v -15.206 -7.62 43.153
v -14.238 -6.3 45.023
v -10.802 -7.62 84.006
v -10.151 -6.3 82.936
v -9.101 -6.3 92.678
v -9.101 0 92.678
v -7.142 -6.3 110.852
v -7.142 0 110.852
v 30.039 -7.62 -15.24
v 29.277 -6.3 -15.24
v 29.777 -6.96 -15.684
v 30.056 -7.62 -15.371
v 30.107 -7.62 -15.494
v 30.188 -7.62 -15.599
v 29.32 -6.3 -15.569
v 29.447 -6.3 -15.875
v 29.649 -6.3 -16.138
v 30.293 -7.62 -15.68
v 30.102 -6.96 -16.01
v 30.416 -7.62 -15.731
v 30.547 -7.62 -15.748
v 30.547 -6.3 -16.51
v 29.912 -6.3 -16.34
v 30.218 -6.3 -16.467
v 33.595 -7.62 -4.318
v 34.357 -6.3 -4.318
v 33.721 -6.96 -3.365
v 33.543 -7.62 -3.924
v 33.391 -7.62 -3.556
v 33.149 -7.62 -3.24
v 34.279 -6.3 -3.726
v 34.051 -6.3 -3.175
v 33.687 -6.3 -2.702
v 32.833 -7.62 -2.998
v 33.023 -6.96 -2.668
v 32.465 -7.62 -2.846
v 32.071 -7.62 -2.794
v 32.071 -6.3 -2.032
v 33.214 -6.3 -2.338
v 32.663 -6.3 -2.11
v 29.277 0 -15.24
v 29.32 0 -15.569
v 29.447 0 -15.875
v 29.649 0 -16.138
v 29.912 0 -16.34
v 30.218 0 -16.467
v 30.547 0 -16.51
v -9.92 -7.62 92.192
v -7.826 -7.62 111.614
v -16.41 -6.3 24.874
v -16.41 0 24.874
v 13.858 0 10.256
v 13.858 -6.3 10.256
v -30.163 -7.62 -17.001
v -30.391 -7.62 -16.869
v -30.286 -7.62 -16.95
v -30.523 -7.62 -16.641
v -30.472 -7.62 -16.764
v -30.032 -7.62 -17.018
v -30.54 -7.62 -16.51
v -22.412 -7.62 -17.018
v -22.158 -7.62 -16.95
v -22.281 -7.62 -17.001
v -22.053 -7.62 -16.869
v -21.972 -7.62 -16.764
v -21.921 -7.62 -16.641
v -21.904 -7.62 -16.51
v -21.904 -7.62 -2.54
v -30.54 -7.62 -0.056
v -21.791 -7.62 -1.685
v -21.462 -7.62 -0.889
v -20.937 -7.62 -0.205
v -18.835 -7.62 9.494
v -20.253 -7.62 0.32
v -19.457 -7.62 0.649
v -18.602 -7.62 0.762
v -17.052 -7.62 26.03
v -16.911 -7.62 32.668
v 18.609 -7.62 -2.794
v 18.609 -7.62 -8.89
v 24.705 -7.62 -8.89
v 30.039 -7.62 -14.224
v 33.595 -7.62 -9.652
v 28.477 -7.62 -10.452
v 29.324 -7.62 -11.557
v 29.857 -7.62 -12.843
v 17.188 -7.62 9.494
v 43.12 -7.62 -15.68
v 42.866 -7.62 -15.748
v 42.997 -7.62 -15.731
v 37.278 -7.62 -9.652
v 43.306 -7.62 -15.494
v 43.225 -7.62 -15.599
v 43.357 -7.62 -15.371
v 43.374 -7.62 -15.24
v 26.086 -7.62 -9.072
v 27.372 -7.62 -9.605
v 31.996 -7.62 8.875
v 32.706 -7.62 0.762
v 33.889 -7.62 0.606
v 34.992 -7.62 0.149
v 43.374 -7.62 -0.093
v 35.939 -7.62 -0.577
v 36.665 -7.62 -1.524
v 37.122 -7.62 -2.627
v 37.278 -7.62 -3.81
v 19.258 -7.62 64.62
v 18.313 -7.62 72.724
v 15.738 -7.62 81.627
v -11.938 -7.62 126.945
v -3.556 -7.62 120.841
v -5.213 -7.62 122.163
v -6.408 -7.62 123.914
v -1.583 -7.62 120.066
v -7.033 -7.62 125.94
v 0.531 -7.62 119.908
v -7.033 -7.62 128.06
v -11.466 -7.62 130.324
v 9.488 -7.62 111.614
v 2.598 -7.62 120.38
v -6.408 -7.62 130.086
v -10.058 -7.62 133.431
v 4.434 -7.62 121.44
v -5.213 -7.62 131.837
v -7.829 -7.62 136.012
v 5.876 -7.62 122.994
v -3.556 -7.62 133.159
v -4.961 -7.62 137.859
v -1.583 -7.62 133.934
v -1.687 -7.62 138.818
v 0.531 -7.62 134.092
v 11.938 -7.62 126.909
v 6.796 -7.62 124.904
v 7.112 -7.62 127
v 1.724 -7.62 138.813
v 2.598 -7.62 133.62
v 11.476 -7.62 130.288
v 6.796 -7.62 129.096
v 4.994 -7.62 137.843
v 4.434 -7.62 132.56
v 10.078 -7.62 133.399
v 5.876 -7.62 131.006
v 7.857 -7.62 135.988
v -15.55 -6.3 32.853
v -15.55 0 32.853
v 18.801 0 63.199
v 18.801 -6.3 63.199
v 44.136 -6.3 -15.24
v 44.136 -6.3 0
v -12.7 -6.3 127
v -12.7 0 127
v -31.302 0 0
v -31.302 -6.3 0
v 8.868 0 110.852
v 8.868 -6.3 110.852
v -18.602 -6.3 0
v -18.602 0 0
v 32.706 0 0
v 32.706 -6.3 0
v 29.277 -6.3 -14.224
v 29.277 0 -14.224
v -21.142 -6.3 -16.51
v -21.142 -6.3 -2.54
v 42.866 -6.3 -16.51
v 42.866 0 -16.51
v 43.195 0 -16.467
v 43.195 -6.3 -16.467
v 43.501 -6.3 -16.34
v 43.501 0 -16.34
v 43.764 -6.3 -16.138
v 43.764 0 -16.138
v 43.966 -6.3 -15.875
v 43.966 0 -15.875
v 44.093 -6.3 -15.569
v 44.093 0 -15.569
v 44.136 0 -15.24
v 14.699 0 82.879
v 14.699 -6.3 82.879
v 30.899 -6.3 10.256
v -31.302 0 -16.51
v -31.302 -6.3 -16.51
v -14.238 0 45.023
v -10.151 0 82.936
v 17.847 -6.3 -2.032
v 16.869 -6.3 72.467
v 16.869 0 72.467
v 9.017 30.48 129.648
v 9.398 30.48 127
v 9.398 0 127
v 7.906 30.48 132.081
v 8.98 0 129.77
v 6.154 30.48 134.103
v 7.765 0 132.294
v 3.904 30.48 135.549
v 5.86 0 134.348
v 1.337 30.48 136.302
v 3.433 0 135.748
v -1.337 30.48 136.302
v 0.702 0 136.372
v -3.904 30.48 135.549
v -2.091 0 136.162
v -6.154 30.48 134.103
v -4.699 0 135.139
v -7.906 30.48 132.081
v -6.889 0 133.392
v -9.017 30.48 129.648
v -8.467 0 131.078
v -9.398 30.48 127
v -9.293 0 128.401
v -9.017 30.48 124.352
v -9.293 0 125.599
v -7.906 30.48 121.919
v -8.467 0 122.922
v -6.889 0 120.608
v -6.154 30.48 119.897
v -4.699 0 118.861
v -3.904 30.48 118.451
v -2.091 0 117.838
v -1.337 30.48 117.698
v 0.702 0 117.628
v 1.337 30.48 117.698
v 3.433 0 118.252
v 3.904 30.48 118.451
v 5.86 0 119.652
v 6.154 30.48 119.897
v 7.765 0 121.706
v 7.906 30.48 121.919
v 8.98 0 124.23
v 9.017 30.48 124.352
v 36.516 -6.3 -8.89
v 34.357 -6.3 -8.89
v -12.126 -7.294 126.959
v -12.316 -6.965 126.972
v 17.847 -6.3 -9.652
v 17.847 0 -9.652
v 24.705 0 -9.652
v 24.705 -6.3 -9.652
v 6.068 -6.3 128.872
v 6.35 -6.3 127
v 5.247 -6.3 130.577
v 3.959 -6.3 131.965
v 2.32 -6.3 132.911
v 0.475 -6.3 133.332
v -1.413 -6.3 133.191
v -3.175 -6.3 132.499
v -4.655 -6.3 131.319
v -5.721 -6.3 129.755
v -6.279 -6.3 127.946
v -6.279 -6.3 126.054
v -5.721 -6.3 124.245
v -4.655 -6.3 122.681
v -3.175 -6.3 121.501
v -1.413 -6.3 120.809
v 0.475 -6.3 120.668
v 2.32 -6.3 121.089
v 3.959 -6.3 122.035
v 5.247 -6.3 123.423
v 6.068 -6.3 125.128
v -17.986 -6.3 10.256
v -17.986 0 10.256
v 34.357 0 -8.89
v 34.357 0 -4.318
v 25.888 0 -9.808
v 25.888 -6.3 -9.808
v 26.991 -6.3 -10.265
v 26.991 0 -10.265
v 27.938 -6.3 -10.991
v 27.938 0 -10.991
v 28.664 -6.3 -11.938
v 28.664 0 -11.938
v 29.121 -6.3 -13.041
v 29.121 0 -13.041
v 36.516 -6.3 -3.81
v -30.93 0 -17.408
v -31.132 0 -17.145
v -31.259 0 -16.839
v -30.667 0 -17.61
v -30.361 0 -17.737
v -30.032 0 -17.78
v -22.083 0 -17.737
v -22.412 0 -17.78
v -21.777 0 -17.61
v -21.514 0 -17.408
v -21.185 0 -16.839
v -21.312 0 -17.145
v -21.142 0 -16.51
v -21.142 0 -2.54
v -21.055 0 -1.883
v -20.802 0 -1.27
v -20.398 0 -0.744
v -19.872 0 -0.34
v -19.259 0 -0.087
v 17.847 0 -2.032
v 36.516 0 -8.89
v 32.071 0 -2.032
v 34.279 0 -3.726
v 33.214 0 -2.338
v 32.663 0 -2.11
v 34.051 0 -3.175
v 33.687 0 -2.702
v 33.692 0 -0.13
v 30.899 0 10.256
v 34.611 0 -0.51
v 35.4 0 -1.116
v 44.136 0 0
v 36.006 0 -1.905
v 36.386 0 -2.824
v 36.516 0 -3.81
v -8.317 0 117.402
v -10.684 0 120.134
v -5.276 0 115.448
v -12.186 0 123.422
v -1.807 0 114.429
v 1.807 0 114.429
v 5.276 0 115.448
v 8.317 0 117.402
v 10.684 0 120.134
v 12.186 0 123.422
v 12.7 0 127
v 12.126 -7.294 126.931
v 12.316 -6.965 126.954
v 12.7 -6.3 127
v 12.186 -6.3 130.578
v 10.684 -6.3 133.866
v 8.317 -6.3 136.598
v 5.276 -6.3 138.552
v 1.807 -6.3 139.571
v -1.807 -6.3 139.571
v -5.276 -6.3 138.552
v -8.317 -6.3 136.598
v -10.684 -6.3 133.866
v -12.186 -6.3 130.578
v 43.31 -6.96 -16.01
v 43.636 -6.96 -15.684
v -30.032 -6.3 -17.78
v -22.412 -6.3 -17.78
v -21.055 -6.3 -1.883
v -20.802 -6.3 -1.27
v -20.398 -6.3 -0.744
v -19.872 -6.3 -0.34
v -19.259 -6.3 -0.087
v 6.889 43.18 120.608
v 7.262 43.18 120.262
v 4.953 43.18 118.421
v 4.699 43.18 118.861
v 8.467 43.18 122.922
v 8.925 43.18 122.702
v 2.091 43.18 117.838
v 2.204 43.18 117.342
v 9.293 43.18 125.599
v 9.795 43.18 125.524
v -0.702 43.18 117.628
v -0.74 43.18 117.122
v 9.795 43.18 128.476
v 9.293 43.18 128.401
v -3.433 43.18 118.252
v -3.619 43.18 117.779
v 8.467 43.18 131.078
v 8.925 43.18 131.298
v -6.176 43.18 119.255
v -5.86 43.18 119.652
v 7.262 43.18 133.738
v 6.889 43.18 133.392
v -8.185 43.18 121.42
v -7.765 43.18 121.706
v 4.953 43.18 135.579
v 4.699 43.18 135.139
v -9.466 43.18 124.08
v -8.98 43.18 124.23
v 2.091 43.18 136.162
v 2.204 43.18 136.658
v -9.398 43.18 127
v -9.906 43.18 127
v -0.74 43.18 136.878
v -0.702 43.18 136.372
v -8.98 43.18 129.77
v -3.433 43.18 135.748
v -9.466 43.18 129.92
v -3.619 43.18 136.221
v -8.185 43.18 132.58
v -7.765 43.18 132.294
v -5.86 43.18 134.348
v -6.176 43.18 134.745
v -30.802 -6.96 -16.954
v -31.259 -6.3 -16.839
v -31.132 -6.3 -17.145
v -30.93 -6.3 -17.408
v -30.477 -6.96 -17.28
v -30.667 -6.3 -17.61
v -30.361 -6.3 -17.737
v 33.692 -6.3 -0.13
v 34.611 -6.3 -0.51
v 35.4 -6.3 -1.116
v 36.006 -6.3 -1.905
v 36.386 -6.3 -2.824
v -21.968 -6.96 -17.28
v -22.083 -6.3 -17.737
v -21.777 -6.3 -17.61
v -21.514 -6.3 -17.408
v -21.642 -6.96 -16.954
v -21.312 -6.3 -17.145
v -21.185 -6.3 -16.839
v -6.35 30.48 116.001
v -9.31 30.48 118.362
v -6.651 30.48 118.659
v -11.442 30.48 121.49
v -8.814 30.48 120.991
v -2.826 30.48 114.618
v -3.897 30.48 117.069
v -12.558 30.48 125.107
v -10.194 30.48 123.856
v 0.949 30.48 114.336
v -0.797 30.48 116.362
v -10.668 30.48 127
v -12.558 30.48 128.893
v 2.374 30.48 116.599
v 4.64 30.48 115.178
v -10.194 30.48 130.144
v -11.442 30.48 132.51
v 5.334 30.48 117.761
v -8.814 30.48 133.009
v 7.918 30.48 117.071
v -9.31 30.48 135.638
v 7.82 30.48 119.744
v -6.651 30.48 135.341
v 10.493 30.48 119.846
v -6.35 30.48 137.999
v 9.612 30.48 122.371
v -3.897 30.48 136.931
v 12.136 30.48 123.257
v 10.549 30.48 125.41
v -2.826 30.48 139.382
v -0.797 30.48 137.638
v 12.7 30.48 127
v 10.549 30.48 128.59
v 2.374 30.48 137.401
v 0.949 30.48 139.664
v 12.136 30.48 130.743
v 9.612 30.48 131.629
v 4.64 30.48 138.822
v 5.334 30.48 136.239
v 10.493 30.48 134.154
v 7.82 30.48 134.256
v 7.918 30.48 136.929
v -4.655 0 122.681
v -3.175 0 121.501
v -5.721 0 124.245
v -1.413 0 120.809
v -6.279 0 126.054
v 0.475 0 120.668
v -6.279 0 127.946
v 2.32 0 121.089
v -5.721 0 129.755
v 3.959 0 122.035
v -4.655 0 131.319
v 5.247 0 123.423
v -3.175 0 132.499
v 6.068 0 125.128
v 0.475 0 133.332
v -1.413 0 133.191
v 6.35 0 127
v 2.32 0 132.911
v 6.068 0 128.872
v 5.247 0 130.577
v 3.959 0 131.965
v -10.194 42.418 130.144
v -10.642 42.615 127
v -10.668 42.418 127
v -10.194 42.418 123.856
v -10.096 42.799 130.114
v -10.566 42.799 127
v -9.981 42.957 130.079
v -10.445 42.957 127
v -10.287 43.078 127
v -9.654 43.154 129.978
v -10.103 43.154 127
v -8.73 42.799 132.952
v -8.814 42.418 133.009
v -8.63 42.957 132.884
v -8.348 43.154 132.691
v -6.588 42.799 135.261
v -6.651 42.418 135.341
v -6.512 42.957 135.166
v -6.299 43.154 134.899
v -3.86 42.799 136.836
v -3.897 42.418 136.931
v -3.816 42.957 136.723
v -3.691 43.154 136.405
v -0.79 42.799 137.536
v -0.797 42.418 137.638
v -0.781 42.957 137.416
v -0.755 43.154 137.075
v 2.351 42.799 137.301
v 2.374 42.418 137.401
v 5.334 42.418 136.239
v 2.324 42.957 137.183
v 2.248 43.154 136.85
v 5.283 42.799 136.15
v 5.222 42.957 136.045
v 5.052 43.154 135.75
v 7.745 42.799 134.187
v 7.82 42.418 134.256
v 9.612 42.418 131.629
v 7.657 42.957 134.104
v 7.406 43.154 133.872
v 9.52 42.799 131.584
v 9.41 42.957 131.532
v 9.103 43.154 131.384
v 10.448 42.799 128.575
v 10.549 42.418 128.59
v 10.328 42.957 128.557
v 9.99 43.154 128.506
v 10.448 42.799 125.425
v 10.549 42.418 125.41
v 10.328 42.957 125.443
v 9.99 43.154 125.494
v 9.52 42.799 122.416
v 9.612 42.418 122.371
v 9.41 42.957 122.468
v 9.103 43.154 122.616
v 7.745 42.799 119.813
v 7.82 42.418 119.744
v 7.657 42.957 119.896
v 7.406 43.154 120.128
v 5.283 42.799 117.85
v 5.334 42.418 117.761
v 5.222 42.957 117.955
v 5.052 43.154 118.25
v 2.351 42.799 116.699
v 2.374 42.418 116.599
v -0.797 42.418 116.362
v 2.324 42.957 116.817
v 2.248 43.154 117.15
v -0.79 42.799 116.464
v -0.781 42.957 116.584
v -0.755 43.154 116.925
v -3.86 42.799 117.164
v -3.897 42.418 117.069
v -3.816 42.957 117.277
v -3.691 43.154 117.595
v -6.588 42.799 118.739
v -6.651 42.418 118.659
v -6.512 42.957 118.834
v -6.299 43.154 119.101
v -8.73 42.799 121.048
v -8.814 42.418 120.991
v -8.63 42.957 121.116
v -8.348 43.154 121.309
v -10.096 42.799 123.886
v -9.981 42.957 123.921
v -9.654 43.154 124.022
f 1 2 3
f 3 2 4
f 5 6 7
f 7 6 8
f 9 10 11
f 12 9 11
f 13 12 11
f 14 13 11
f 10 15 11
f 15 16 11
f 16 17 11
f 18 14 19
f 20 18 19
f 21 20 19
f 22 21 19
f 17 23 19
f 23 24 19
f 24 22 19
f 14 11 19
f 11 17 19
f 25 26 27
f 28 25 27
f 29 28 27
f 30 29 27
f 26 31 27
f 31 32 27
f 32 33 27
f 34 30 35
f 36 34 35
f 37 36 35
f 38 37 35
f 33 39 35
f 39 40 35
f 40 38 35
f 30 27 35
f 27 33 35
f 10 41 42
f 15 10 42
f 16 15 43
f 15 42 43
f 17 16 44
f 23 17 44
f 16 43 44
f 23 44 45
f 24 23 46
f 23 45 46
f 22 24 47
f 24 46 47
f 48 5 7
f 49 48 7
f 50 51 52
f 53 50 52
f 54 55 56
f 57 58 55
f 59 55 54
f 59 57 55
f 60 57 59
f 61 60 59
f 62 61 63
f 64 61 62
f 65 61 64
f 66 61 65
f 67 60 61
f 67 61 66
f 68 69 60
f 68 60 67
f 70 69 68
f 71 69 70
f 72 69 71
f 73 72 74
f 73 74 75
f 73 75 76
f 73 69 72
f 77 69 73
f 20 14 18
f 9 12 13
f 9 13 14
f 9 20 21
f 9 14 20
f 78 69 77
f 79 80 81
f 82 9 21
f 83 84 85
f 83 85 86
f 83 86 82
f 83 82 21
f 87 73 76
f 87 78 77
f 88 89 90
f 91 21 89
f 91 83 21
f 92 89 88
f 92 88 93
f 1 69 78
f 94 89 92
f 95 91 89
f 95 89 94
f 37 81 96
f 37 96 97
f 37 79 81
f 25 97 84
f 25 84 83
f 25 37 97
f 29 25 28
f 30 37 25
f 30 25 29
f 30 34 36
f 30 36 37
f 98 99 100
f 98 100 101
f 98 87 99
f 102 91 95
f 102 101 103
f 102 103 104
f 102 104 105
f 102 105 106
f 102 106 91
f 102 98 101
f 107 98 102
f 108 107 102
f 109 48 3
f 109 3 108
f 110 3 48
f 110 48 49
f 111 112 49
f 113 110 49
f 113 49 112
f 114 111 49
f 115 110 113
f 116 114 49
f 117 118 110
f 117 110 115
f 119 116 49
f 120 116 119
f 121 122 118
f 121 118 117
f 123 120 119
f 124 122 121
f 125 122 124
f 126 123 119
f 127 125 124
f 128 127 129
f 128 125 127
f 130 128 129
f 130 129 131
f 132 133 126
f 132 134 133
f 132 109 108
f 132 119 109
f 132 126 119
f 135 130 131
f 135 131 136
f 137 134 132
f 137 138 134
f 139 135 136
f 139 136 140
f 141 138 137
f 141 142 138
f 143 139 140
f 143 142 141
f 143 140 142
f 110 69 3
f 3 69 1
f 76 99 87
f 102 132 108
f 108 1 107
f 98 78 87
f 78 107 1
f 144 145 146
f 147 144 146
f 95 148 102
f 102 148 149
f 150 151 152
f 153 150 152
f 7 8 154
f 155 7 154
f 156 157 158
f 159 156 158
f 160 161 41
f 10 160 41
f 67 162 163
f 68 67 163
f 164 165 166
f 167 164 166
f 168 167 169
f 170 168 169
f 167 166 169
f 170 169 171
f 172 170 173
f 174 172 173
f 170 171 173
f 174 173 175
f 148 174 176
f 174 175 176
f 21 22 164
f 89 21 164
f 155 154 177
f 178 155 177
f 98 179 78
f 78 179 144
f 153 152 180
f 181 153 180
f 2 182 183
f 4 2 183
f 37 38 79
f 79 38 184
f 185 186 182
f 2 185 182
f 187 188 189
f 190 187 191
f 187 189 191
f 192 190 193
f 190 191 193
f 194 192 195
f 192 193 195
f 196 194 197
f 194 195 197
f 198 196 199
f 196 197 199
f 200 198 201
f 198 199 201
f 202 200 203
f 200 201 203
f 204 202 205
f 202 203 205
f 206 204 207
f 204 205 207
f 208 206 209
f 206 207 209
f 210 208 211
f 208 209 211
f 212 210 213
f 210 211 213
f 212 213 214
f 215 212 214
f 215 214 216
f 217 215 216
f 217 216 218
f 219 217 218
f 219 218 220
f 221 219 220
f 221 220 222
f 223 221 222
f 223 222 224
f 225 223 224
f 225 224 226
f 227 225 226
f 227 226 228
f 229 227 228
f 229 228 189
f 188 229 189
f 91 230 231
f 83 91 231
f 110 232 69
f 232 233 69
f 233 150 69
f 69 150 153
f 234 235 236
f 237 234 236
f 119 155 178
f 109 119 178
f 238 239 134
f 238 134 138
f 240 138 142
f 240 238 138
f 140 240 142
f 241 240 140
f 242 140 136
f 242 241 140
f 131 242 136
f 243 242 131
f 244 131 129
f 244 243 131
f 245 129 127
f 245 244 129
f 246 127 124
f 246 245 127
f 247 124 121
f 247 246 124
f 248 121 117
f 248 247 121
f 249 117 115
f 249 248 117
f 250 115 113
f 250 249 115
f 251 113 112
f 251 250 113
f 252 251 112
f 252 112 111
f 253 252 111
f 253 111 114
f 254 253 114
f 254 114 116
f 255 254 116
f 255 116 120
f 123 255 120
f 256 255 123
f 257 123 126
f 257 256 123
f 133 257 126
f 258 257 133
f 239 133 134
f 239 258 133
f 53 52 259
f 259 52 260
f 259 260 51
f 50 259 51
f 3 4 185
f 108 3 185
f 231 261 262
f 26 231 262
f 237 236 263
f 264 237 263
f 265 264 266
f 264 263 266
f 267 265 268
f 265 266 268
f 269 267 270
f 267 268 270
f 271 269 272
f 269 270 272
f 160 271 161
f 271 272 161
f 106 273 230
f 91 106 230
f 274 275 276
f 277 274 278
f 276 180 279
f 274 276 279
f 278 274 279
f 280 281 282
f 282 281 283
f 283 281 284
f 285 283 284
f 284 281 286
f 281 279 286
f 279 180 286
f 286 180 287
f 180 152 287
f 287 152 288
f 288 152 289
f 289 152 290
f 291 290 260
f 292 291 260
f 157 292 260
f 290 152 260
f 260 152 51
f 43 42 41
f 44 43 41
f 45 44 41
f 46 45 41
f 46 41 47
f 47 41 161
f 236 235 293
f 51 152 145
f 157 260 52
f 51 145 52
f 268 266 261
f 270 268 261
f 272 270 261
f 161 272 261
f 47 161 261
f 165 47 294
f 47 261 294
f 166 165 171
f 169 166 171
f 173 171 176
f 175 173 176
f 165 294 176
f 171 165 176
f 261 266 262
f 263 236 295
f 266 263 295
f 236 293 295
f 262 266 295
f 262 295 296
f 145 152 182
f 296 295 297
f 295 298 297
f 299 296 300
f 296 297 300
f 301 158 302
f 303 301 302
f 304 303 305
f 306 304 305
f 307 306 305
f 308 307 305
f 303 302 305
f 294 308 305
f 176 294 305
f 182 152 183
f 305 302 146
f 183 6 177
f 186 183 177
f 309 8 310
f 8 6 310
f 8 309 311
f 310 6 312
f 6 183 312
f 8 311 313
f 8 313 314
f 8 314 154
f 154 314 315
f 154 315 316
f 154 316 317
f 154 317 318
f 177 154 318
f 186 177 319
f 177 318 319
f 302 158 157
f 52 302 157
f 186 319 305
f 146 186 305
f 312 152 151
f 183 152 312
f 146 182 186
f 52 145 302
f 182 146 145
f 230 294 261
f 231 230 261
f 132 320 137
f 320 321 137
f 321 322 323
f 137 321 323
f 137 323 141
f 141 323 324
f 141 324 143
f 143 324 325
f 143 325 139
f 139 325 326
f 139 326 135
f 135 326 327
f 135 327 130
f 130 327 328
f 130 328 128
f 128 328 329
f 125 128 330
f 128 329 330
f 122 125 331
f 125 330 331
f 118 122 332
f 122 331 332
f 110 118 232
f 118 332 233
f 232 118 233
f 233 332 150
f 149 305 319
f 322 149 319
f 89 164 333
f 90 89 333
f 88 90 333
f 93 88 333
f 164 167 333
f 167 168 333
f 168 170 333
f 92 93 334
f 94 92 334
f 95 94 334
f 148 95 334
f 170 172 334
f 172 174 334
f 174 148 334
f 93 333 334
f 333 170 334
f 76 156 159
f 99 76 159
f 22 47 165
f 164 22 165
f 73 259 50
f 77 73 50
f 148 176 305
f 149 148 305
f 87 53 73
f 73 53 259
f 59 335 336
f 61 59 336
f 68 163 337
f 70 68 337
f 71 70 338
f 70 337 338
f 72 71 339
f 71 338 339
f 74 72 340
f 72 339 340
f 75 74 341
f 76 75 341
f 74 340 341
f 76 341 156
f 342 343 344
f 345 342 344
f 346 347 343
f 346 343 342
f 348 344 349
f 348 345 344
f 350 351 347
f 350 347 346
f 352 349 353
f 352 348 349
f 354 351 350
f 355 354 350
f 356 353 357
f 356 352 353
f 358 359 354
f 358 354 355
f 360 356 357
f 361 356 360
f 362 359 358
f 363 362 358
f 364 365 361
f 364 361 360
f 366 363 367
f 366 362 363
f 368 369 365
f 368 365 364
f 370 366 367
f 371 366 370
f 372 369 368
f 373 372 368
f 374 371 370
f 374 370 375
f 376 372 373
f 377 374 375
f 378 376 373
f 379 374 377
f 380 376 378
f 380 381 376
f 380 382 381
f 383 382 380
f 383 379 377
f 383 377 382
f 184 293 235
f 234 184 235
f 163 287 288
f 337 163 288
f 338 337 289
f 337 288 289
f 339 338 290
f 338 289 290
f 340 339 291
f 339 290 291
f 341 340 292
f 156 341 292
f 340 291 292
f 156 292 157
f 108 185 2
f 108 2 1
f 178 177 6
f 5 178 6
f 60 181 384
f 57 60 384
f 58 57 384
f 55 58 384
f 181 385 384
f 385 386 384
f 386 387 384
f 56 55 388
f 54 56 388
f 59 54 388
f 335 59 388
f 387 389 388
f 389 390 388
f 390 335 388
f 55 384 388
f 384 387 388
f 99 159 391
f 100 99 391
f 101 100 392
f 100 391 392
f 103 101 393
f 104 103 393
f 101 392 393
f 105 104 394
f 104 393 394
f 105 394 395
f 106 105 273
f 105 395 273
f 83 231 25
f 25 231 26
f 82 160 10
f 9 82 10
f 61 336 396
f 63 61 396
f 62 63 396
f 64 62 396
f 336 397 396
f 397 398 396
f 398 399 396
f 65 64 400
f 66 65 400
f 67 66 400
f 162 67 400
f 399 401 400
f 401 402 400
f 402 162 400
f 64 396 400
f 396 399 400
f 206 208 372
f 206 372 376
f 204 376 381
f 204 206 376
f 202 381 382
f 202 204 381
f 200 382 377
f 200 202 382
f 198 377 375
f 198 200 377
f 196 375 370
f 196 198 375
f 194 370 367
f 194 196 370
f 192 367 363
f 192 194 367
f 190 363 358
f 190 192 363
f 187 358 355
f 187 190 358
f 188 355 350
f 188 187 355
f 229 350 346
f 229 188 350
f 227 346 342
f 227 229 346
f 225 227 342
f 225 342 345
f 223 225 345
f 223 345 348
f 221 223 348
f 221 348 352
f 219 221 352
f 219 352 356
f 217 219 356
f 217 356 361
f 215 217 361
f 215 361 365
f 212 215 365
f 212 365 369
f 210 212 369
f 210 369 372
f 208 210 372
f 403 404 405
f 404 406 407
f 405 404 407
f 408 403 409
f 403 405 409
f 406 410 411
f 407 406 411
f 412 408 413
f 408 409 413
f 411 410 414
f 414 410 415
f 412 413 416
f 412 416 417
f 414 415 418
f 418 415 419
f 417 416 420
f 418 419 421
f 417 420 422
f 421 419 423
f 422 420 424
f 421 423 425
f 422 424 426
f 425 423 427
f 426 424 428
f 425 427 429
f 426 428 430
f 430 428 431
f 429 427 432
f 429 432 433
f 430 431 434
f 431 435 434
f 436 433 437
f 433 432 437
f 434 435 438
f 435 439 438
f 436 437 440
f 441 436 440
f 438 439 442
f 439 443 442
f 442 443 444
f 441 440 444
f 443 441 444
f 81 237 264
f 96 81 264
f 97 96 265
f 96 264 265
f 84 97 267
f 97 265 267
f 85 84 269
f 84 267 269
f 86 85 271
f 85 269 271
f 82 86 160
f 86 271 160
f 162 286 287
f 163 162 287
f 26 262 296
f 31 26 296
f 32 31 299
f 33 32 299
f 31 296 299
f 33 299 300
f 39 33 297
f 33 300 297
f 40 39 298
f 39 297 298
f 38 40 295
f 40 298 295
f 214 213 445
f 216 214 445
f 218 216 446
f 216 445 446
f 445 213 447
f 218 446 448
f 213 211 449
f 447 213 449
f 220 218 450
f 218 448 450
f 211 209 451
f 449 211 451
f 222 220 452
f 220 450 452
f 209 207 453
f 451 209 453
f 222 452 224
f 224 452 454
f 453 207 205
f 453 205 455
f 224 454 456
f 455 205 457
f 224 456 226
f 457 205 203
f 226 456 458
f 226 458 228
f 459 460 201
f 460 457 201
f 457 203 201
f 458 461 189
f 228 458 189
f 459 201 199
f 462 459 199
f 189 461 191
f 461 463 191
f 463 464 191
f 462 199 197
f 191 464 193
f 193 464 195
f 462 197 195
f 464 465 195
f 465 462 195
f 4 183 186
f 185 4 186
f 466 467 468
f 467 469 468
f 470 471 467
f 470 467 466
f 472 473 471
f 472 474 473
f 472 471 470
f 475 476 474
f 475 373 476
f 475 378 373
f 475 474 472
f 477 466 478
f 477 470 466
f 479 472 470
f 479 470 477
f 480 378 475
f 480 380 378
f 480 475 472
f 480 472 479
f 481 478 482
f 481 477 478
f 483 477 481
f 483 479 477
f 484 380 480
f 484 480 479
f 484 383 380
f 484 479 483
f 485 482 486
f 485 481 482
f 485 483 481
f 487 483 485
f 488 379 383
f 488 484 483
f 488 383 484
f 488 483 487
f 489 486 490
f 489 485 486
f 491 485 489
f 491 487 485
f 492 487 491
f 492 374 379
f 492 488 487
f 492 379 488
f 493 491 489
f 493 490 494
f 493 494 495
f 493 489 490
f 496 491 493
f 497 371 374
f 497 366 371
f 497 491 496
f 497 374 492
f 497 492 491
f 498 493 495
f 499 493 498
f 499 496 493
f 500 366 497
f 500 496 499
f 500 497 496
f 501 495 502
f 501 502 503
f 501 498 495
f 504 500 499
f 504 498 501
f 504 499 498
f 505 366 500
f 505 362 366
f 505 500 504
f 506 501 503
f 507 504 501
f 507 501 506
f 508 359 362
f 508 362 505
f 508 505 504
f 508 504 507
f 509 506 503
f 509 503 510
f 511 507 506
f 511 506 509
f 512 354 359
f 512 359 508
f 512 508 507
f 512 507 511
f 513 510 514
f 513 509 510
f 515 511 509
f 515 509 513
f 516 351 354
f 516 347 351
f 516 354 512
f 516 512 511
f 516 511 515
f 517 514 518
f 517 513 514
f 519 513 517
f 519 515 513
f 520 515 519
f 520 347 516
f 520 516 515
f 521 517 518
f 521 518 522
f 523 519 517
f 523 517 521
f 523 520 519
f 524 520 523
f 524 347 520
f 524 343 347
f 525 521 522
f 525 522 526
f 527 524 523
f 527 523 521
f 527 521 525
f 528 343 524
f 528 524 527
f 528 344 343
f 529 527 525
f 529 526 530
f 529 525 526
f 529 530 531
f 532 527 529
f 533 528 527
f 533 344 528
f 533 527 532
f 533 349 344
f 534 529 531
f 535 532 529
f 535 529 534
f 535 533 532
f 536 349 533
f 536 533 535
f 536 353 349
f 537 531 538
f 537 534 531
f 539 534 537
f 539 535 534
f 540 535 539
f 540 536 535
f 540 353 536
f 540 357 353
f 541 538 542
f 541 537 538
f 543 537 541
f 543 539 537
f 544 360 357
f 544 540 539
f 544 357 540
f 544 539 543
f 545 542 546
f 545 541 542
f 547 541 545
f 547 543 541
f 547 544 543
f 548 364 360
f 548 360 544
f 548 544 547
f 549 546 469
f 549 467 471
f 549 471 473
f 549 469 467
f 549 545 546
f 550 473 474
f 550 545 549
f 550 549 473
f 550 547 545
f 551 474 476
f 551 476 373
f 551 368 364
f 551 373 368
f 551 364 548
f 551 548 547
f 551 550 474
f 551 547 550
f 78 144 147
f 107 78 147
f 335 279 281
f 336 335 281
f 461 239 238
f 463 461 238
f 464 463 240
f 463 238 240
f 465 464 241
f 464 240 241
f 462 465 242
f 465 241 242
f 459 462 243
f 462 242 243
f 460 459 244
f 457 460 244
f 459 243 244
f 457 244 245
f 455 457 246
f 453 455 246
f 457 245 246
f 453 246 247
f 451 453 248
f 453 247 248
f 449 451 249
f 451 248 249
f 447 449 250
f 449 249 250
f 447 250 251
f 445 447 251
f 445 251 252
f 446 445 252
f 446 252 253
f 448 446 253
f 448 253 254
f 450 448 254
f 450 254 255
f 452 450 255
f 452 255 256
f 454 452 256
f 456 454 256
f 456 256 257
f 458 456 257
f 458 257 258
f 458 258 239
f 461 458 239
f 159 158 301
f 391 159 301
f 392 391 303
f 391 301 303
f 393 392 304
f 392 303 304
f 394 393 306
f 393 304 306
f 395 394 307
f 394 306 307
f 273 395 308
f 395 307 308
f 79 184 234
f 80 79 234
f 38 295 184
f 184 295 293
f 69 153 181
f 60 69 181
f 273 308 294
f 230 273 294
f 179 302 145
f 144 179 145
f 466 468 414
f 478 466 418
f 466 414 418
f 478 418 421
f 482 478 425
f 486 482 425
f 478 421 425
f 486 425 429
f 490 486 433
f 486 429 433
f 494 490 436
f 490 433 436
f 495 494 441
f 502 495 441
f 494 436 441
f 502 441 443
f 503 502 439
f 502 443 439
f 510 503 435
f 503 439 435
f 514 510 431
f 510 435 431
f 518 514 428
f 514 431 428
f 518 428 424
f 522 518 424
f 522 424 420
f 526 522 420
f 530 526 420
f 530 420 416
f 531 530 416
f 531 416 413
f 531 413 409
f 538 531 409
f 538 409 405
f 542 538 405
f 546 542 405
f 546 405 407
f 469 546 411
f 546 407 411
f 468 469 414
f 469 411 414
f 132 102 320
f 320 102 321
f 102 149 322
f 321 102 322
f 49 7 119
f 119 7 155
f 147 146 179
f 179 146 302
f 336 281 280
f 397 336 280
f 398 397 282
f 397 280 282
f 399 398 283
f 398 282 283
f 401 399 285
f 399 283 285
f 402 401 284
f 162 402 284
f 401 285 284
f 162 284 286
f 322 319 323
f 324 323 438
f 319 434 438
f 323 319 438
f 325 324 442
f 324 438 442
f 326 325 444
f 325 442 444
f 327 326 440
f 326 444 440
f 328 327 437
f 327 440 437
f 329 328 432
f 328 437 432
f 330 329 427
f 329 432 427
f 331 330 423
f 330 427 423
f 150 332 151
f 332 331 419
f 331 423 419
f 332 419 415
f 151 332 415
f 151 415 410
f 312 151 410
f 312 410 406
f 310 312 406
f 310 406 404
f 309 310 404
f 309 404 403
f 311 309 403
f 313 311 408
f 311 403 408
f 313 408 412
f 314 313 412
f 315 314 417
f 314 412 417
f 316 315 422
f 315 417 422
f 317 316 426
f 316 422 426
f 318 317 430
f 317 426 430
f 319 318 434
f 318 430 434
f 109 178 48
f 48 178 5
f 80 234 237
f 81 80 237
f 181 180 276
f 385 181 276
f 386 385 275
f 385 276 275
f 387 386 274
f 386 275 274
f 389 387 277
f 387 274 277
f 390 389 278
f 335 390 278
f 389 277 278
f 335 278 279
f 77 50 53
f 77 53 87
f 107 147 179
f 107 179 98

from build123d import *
from build123d import SkipClean  # not in build123d's __all__

# Parameters (mm, degrees)
F1_DEPTH = 7.62
F2_R     = 12.7
F2_R_2   = 9.398
F3_DEPTH = 38.1
F4_R     = 10.668
F4_R_2   = 9.398
F5_DEPTH = 12.7
F6_R     = 6.35
F7_DEPTH = 25.4
F8_SIZE2 = 1.3198227154
F8_SIZE  = 0.762
F9_R     = 0.762


# Not quite as in the source:
# - after a boolean that leaves OpenCascade's solid faulty, fix() repairs it


with BuildPart() as f1:
    # F0 (on Front) → F1 (new body)
    with BuildSketch(Plane.XZ):
        with BuildLine():
            ThreePointArc((-21.1420084076, -2.54), (-20.3980596318, -0.7439487758), (-18.6020084076, 0))
            Line((-18.6020084076, 0), (32.7059915924, 0))
            ThreePointArc((32.7059915924, 0), (35.4000684287, -1.1159231637), (36.5159915924, -3.81))
            Line((36.5159915924, -3.81), (36.5159915924, -8.89))
            Line((36.5159915924, -8.89), (34.3569915924, -8.89))
            Line((34.3569915924, -8.89), (34.3569915924, -4.318))
            ThreePointArc((34.3569915924, -4.318), (33.6874376942, -2.7015538982), (32.0709915924, -2.032))
            Line((32.0709915924, -2.032), (29.2769915924, -2.032))
            Line((29.2769915924, -2.032), (17.8469915924, -2.032))
            Line((17.8469915924, -2.032), (17.8469915924, -9.652))
            Line((17.8469915924, -9.652), (24.7049915924, -9.652))
            ThreePointArc((24.7049915924, -9.652), (27.937883796, -10.9911077964), (29.2769915924, -14.224))
            Line((29.2769915924, -14.224), (29.2769915924, -15.24))
            ThreePointArc((29.2769915924, -15.24), (29.6489659803, -16.1380256121), (30.5469915924, -16.51))
            Line((30.5469915924, -16.51), (42.8659915924, -16.51))
            ThreePointArc((42.8659915924, -16.51), (43.7640172045, -16.1380256121), (44.1359915924, -15.24))
            Line((44.1359915924, -15.24), (44.1359915924, 0))
            Line((44.1359915924, 0), (12.7, 127))
            ThreePointArc((12.7, 127), (0, 139.7), (-12.7, 127))
            Line((-12.7, 127), (-31.3020084076, 0))
            Line((-31.3020084076, 0), (-31.3020084076, -16.51))
            ThreePointArc((-31.3020084076, -16.51), (-30.9300340197, -17.4080256121), (-30.0320084076, -17.78))
            Line((-30.0320084076, -17.78), (-22.4120084076, -17.78))
            ThreePointArc((-22.4120084076, -17.78), (-21.5139827955, -17.4080256121), (-21.1420084076, -16.51))
            Line((-21.1420084076, -16.51), (-21.1420084076, -2.54))
        make_face()
        Polygon((13.8583155349, 10.2559253573), (-17.4904800951, 10.2559253573), (-17.9861974368, 10.2559253573), (-16.4103638381, 24.8740110546), align=None, mode=Mode.SUBTRACT)
        Polygon((30.8991490559, 10.2559253573), (-15.5502194539, 32.8530669212), (18.8005114427, 63.1991239488), align=None, mode=Mode.SUBTRACT)
        Polygon((16.8689347681, 72.4665825348), (-14.2382610105, 45.0233372929), (-10.1512422372, 82.9362176403), align=None, mode=Mode.SUBTRACT)
        Polygon((-7.1419274588, 110.8518689871), (8.8684540242, 110.8518689871), (14.6986516415, 82.8793242388), (-9.1010310551, 92.6784119132), align=None, mode=Mode.SUBTRACT)
    extrude(amount=F1_DEPTH)

    # F2 (on face) → F3 (join)
    with BuildSketch(Plane.XZ.offset(7.62)):
        with Locations((0, 127)):
            Circle(F2_R)
        with Locations((0, 127)):
            Circle(F2_R_2, mode=Mode.SUBTRACT)
    extrude(amount=-F3_DEPTH)

    # F4 (on face) → F5 (join)
    with BuildSketch(Plane(origin=(0, 30.48, 0), x_dir=(-1, 0, 0), z_dir=(0, 1, 0))):
        with Locations((0, 127)):
            Circle(F4_R)
        with Locations((0, 127)):
            Circle(F4_R_2, mode=Mode.SUBTRACT)
    with SkipClean():  # cleaning this boolean's faces spoils the solid; the shape is the same uncleaned
        extrude(amount=F5_DEPTH)

    # F6 (on face) → F7 (cut)
    with BuildSketch(Plane.XZ.offset(7.62)):
        with Locations((0, 127)):
            Circle(F6_R)
    extrude(amount=-F7_DEPTH, mode=Mode.SUBTRACT)

    add(f1.part.fix(), mode=Mode.REPLACE)

    # F8
    f8_edges = [f1.edges().sort_by_distance(p)[0] for p in [
        (-22.001004, -7.62, 63.5),
        (-31.302008, -7.62, -8.255),
        (-30.930034, -7.62, -17.408026),
        (-26.222008, -7.62, -17.78),
        (-21.513983, -7.62, -17.408026),
        (-21.142008, -7.62, -9.525),
        (-20.39806, -7.62, -0.743949),
        (7.051992, -7.62, 0),
        (35.400068, -7.62, -1.115923),
        (36.515992, -7.62, -6.35),
        (35.436492, -7.62, -8.89),
        (34.356992, -7.62, -6.604),
        (33.687438, -7.62, -2.701554),
        (24.958992, -7.62, -2.032),
        (17.846992, -7.62, -5.842),
        (21.275992, -7.62, -9.652),
        (27.937884, -7.62, -10.991108),
        (29.276992, -7.62, -14.732),
        (29.648966, -7.62, -16.138026),
        (36.706492, -7.62, -16.51),
        (43.764017, -7.62, -16.138026),
        (44.135992, -7.62, -7.62),
        (28.417996, -7.62, 63.5),
        (0, -7.62, 139.7),
        (-17.198281, -7.62, 17.564968),
        (-1.276024, -7.62, 17.564968),
        (-2.063941, -7.62, 10.255925),
        (1.315337, -7.62, 58.74496),
        (-12.194752, -7.62, 63.979777),
        (3.358846, -7.62, 77.7014),
        (24.84983, -7.62, 36.727525),
        (7.674465, -7.62, 21.554496),
        (1.625146, -7.62, 48.026095),
        (0.863263, -7.62, 110.851869),
        (11.783553, -7.62, 96.865597),
        (2.79881, -7.62, 87.778868),
        (-8.121479, -7.62, 101.76514),
        (-6.35, -7.62, 127),
    ]]
    f8_side = f1.faces().sort_by_distance((-20.273277, -7.62, 63.246935))[0]
    chamfer(f8_edges, length=F8_SIZE, length2=F8_SIZE2, reference=f8_side)

    # F9
    f9_edges = [f1.edges().sort_by_distance(p)[0] for p in [
        (10.668, 43.18, 127),
    ]]
    fillet(f9_edges, radius=F9_R)


solid = f1.part
